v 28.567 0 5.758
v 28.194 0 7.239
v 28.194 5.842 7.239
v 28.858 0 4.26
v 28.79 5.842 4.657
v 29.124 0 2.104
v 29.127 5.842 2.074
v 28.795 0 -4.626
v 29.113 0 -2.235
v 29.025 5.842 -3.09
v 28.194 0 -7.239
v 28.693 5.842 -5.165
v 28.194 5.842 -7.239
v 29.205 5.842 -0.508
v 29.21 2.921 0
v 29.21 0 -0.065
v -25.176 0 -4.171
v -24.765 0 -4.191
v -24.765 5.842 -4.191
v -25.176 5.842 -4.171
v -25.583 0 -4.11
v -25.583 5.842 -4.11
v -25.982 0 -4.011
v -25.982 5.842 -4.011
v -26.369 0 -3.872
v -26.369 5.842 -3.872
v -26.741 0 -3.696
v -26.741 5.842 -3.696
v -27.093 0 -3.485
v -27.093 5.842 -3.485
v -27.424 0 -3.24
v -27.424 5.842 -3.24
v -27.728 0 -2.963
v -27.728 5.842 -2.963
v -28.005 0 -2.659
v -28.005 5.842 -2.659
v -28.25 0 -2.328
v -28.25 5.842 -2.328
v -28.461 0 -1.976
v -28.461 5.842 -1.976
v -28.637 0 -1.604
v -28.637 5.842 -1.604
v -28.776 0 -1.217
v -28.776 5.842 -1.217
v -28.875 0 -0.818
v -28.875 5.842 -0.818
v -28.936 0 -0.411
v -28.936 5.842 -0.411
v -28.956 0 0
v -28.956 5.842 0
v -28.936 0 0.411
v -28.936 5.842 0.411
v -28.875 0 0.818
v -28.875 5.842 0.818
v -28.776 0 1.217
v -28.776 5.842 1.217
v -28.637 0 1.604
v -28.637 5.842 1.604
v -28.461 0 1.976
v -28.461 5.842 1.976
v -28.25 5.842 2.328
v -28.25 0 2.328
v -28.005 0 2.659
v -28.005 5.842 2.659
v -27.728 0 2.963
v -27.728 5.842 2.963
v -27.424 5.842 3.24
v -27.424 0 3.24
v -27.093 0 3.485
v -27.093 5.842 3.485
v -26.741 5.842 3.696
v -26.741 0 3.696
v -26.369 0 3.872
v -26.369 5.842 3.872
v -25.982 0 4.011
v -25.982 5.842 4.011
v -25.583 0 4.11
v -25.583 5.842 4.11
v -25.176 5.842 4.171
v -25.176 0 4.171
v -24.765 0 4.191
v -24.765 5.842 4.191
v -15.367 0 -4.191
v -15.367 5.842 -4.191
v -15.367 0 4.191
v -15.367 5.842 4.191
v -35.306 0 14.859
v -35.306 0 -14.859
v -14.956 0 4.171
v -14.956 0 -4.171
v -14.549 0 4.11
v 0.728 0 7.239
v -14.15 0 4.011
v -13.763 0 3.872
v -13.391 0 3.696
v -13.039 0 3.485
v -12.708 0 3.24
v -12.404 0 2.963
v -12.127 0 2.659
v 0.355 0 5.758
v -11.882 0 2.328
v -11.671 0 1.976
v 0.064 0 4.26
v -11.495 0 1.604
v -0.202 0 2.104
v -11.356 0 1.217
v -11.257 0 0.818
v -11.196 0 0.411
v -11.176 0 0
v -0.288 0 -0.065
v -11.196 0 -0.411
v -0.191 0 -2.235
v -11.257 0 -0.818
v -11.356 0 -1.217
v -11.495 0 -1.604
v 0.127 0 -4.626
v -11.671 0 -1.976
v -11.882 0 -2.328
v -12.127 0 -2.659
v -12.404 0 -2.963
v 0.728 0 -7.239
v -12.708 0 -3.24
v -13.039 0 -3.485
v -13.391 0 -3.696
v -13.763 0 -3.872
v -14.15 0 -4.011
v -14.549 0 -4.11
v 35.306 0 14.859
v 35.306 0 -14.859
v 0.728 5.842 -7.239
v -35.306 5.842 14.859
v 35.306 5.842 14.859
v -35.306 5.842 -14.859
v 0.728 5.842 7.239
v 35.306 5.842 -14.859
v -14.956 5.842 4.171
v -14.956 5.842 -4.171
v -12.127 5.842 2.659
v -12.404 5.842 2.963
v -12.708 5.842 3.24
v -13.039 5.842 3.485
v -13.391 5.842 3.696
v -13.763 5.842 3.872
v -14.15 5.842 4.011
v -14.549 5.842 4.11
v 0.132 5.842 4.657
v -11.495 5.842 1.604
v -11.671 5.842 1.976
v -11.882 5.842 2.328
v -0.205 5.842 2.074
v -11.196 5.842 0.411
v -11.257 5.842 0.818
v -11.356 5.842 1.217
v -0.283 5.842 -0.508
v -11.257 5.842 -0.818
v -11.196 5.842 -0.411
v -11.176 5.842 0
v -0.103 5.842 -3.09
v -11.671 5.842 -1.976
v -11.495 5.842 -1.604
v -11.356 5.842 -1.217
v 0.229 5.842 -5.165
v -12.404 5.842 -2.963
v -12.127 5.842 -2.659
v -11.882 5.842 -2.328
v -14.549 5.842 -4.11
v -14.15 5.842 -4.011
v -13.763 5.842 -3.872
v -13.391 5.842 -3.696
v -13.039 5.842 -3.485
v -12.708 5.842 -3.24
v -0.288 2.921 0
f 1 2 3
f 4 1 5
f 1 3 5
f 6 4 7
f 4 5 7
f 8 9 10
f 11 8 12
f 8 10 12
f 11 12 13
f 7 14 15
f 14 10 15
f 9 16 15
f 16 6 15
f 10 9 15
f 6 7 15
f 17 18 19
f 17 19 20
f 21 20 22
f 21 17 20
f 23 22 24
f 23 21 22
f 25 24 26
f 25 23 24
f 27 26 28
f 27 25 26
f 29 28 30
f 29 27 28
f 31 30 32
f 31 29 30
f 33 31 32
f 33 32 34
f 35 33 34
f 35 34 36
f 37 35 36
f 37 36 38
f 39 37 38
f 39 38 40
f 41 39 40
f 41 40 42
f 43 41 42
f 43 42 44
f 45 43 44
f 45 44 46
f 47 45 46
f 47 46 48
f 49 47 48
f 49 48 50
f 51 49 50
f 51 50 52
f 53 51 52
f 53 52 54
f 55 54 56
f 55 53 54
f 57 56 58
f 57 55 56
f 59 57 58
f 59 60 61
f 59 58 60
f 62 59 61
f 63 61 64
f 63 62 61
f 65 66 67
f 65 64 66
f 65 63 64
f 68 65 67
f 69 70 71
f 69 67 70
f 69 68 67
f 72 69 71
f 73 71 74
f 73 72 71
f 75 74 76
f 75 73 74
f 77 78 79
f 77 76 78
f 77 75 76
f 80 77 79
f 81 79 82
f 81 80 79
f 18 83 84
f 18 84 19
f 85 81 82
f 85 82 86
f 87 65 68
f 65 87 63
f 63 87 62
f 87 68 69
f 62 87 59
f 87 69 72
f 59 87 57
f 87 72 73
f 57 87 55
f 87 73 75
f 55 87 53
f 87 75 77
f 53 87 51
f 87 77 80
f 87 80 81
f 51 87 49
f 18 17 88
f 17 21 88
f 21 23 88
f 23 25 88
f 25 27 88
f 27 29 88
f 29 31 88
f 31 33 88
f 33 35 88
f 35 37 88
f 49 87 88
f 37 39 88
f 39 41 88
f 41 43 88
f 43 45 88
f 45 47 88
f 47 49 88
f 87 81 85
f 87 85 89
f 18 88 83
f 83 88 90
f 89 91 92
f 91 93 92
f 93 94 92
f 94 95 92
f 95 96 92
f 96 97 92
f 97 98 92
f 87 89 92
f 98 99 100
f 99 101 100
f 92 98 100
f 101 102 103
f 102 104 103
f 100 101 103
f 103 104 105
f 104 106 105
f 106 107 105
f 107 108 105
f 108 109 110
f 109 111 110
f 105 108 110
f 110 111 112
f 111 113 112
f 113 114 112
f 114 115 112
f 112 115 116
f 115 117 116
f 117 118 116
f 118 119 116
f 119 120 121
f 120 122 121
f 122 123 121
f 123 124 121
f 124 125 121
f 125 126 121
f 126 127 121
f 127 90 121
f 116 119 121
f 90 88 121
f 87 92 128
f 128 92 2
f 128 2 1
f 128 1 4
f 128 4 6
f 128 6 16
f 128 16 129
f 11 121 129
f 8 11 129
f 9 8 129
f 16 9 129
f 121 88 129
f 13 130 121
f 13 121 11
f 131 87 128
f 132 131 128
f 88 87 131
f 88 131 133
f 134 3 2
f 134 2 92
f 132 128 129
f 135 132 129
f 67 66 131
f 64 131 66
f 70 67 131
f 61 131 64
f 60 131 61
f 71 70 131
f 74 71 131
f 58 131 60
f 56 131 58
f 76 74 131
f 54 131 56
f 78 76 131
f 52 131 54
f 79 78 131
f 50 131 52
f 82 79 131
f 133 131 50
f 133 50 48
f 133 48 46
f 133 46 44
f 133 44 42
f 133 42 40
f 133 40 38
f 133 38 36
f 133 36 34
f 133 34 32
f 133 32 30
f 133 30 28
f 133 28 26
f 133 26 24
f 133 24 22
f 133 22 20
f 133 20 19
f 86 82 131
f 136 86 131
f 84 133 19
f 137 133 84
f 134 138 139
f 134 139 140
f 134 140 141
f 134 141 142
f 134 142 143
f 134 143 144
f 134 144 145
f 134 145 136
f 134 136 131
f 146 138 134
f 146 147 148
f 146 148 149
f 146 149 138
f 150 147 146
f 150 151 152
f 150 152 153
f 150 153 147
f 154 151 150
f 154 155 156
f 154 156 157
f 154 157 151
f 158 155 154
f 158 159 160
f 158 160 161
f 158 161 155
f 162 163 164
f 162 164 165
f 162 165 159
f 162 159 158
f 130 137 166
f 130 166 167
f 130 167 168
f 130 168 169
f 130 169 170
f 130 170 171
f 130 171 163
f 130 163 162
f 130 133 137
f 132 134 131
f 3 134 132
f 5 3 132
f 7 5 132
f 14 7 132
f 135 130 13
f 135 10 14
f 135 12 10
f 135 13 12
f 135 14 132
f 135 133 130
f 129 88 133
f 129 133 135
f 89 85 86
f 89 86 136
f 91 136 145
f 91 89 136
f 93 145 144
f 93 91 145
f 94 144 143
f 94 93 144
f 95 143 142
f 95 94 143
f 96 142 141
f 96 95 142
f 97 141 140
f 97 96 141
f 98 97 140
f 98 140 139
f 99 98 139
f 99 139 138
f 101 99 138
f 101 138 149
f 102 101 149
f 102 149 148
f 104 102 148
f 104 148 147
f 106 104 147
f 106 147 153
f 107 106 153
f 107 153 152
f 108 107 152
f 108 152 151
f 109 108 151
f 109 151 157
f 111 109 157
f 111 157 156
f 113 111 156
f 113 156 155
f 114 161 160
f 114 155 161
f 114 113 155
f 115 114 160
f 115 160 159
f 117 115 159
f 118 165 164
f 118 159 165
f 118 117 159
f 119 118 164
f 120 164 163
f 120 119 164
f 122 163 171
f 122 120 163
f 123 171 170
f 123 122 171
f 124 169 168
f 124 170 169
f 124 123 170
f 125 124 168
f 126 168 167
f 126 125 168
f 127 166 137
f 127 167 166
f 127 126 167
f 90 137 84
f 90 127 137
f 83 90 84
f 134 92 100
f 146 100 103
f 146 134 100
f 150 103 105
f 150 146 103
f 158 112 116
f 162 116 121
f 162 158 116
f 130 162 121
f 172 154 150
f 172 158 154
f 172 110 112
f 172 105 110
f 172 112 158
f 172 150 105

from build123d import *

# Parameters (mm, degrees)
SKETCH1_W           = 70.612
SKETCH1_H           = 29.718
BOSS_EXTRUDE1_DEPTH = 5.842
CUT_EXTRUDE1_DEPTH  = 6.842
CUT_EXTRUDE2_DEPTH  = 6.8420001


with BuildPart() as part:
    # Sketch1 → Boss-Extrude1 (new body)
    with BuildSketch(Plane(origin=(0, 0, 0), x_dir=(1, 0, 0), z_dir=(0, 1, 0))):
        Rectangle(SKETCH1_W, SKETCH1_H)
    extrude(amount=BOSS_EXTRUDE1_DEPTH)

    # Sketch2 → Cut-Extrude1 (cut, through all)
    with BuildSketch(Plane(origin=(0, 5.842, 0), x_dir=(1, 0, 0), z_dir=(0, 1, 0))):
        with BuildLine():
            Line((0.727778591, 7.239), (28.194, 7.239))
            add(Edge.make_bspline(
                [(28.194, -7.239), (30.226, 0), (28.194, 7.239)],
                knots=[0, 0, 0, 1, 1, 1], degree=2))
            Line((28.194, -7.239), (0.727778591, -7.239))
            add(Edge.make_bspline(
                [(0.727778591, -7.239), (-1.304221409, 0), (0.727778591, 7.239)],
                knots=[0, 0, 0, 1, 1, 1], degree=2))
        make_face()
    extrude(amount=-CUT_EXTRUDE1_DEPTH, mode=Mode.SUBTRACT)

    # Sketch3 → Cut-Extrude2 (cut, through all)
    with BuildSketch(Plane.XZ):
        with BuildLine():
            Line((-24.765, 4.191), (-15.367, 4.191))
            ThreePointArc((-15.367, 4.191), (-11.176, 0), (-15.367, -4.191))
            Line((-15.367, -4.191), (-24.765, -4.191))
            ThreePointArc((-24.765, -4.191), (-28.956, 0), (-24.765, 4.191))
        make_face()
    extrude(amount=-CUT_EXTRUDE2_DEPTH, mode=Mode.SUBTRACT)


solid = part.part
